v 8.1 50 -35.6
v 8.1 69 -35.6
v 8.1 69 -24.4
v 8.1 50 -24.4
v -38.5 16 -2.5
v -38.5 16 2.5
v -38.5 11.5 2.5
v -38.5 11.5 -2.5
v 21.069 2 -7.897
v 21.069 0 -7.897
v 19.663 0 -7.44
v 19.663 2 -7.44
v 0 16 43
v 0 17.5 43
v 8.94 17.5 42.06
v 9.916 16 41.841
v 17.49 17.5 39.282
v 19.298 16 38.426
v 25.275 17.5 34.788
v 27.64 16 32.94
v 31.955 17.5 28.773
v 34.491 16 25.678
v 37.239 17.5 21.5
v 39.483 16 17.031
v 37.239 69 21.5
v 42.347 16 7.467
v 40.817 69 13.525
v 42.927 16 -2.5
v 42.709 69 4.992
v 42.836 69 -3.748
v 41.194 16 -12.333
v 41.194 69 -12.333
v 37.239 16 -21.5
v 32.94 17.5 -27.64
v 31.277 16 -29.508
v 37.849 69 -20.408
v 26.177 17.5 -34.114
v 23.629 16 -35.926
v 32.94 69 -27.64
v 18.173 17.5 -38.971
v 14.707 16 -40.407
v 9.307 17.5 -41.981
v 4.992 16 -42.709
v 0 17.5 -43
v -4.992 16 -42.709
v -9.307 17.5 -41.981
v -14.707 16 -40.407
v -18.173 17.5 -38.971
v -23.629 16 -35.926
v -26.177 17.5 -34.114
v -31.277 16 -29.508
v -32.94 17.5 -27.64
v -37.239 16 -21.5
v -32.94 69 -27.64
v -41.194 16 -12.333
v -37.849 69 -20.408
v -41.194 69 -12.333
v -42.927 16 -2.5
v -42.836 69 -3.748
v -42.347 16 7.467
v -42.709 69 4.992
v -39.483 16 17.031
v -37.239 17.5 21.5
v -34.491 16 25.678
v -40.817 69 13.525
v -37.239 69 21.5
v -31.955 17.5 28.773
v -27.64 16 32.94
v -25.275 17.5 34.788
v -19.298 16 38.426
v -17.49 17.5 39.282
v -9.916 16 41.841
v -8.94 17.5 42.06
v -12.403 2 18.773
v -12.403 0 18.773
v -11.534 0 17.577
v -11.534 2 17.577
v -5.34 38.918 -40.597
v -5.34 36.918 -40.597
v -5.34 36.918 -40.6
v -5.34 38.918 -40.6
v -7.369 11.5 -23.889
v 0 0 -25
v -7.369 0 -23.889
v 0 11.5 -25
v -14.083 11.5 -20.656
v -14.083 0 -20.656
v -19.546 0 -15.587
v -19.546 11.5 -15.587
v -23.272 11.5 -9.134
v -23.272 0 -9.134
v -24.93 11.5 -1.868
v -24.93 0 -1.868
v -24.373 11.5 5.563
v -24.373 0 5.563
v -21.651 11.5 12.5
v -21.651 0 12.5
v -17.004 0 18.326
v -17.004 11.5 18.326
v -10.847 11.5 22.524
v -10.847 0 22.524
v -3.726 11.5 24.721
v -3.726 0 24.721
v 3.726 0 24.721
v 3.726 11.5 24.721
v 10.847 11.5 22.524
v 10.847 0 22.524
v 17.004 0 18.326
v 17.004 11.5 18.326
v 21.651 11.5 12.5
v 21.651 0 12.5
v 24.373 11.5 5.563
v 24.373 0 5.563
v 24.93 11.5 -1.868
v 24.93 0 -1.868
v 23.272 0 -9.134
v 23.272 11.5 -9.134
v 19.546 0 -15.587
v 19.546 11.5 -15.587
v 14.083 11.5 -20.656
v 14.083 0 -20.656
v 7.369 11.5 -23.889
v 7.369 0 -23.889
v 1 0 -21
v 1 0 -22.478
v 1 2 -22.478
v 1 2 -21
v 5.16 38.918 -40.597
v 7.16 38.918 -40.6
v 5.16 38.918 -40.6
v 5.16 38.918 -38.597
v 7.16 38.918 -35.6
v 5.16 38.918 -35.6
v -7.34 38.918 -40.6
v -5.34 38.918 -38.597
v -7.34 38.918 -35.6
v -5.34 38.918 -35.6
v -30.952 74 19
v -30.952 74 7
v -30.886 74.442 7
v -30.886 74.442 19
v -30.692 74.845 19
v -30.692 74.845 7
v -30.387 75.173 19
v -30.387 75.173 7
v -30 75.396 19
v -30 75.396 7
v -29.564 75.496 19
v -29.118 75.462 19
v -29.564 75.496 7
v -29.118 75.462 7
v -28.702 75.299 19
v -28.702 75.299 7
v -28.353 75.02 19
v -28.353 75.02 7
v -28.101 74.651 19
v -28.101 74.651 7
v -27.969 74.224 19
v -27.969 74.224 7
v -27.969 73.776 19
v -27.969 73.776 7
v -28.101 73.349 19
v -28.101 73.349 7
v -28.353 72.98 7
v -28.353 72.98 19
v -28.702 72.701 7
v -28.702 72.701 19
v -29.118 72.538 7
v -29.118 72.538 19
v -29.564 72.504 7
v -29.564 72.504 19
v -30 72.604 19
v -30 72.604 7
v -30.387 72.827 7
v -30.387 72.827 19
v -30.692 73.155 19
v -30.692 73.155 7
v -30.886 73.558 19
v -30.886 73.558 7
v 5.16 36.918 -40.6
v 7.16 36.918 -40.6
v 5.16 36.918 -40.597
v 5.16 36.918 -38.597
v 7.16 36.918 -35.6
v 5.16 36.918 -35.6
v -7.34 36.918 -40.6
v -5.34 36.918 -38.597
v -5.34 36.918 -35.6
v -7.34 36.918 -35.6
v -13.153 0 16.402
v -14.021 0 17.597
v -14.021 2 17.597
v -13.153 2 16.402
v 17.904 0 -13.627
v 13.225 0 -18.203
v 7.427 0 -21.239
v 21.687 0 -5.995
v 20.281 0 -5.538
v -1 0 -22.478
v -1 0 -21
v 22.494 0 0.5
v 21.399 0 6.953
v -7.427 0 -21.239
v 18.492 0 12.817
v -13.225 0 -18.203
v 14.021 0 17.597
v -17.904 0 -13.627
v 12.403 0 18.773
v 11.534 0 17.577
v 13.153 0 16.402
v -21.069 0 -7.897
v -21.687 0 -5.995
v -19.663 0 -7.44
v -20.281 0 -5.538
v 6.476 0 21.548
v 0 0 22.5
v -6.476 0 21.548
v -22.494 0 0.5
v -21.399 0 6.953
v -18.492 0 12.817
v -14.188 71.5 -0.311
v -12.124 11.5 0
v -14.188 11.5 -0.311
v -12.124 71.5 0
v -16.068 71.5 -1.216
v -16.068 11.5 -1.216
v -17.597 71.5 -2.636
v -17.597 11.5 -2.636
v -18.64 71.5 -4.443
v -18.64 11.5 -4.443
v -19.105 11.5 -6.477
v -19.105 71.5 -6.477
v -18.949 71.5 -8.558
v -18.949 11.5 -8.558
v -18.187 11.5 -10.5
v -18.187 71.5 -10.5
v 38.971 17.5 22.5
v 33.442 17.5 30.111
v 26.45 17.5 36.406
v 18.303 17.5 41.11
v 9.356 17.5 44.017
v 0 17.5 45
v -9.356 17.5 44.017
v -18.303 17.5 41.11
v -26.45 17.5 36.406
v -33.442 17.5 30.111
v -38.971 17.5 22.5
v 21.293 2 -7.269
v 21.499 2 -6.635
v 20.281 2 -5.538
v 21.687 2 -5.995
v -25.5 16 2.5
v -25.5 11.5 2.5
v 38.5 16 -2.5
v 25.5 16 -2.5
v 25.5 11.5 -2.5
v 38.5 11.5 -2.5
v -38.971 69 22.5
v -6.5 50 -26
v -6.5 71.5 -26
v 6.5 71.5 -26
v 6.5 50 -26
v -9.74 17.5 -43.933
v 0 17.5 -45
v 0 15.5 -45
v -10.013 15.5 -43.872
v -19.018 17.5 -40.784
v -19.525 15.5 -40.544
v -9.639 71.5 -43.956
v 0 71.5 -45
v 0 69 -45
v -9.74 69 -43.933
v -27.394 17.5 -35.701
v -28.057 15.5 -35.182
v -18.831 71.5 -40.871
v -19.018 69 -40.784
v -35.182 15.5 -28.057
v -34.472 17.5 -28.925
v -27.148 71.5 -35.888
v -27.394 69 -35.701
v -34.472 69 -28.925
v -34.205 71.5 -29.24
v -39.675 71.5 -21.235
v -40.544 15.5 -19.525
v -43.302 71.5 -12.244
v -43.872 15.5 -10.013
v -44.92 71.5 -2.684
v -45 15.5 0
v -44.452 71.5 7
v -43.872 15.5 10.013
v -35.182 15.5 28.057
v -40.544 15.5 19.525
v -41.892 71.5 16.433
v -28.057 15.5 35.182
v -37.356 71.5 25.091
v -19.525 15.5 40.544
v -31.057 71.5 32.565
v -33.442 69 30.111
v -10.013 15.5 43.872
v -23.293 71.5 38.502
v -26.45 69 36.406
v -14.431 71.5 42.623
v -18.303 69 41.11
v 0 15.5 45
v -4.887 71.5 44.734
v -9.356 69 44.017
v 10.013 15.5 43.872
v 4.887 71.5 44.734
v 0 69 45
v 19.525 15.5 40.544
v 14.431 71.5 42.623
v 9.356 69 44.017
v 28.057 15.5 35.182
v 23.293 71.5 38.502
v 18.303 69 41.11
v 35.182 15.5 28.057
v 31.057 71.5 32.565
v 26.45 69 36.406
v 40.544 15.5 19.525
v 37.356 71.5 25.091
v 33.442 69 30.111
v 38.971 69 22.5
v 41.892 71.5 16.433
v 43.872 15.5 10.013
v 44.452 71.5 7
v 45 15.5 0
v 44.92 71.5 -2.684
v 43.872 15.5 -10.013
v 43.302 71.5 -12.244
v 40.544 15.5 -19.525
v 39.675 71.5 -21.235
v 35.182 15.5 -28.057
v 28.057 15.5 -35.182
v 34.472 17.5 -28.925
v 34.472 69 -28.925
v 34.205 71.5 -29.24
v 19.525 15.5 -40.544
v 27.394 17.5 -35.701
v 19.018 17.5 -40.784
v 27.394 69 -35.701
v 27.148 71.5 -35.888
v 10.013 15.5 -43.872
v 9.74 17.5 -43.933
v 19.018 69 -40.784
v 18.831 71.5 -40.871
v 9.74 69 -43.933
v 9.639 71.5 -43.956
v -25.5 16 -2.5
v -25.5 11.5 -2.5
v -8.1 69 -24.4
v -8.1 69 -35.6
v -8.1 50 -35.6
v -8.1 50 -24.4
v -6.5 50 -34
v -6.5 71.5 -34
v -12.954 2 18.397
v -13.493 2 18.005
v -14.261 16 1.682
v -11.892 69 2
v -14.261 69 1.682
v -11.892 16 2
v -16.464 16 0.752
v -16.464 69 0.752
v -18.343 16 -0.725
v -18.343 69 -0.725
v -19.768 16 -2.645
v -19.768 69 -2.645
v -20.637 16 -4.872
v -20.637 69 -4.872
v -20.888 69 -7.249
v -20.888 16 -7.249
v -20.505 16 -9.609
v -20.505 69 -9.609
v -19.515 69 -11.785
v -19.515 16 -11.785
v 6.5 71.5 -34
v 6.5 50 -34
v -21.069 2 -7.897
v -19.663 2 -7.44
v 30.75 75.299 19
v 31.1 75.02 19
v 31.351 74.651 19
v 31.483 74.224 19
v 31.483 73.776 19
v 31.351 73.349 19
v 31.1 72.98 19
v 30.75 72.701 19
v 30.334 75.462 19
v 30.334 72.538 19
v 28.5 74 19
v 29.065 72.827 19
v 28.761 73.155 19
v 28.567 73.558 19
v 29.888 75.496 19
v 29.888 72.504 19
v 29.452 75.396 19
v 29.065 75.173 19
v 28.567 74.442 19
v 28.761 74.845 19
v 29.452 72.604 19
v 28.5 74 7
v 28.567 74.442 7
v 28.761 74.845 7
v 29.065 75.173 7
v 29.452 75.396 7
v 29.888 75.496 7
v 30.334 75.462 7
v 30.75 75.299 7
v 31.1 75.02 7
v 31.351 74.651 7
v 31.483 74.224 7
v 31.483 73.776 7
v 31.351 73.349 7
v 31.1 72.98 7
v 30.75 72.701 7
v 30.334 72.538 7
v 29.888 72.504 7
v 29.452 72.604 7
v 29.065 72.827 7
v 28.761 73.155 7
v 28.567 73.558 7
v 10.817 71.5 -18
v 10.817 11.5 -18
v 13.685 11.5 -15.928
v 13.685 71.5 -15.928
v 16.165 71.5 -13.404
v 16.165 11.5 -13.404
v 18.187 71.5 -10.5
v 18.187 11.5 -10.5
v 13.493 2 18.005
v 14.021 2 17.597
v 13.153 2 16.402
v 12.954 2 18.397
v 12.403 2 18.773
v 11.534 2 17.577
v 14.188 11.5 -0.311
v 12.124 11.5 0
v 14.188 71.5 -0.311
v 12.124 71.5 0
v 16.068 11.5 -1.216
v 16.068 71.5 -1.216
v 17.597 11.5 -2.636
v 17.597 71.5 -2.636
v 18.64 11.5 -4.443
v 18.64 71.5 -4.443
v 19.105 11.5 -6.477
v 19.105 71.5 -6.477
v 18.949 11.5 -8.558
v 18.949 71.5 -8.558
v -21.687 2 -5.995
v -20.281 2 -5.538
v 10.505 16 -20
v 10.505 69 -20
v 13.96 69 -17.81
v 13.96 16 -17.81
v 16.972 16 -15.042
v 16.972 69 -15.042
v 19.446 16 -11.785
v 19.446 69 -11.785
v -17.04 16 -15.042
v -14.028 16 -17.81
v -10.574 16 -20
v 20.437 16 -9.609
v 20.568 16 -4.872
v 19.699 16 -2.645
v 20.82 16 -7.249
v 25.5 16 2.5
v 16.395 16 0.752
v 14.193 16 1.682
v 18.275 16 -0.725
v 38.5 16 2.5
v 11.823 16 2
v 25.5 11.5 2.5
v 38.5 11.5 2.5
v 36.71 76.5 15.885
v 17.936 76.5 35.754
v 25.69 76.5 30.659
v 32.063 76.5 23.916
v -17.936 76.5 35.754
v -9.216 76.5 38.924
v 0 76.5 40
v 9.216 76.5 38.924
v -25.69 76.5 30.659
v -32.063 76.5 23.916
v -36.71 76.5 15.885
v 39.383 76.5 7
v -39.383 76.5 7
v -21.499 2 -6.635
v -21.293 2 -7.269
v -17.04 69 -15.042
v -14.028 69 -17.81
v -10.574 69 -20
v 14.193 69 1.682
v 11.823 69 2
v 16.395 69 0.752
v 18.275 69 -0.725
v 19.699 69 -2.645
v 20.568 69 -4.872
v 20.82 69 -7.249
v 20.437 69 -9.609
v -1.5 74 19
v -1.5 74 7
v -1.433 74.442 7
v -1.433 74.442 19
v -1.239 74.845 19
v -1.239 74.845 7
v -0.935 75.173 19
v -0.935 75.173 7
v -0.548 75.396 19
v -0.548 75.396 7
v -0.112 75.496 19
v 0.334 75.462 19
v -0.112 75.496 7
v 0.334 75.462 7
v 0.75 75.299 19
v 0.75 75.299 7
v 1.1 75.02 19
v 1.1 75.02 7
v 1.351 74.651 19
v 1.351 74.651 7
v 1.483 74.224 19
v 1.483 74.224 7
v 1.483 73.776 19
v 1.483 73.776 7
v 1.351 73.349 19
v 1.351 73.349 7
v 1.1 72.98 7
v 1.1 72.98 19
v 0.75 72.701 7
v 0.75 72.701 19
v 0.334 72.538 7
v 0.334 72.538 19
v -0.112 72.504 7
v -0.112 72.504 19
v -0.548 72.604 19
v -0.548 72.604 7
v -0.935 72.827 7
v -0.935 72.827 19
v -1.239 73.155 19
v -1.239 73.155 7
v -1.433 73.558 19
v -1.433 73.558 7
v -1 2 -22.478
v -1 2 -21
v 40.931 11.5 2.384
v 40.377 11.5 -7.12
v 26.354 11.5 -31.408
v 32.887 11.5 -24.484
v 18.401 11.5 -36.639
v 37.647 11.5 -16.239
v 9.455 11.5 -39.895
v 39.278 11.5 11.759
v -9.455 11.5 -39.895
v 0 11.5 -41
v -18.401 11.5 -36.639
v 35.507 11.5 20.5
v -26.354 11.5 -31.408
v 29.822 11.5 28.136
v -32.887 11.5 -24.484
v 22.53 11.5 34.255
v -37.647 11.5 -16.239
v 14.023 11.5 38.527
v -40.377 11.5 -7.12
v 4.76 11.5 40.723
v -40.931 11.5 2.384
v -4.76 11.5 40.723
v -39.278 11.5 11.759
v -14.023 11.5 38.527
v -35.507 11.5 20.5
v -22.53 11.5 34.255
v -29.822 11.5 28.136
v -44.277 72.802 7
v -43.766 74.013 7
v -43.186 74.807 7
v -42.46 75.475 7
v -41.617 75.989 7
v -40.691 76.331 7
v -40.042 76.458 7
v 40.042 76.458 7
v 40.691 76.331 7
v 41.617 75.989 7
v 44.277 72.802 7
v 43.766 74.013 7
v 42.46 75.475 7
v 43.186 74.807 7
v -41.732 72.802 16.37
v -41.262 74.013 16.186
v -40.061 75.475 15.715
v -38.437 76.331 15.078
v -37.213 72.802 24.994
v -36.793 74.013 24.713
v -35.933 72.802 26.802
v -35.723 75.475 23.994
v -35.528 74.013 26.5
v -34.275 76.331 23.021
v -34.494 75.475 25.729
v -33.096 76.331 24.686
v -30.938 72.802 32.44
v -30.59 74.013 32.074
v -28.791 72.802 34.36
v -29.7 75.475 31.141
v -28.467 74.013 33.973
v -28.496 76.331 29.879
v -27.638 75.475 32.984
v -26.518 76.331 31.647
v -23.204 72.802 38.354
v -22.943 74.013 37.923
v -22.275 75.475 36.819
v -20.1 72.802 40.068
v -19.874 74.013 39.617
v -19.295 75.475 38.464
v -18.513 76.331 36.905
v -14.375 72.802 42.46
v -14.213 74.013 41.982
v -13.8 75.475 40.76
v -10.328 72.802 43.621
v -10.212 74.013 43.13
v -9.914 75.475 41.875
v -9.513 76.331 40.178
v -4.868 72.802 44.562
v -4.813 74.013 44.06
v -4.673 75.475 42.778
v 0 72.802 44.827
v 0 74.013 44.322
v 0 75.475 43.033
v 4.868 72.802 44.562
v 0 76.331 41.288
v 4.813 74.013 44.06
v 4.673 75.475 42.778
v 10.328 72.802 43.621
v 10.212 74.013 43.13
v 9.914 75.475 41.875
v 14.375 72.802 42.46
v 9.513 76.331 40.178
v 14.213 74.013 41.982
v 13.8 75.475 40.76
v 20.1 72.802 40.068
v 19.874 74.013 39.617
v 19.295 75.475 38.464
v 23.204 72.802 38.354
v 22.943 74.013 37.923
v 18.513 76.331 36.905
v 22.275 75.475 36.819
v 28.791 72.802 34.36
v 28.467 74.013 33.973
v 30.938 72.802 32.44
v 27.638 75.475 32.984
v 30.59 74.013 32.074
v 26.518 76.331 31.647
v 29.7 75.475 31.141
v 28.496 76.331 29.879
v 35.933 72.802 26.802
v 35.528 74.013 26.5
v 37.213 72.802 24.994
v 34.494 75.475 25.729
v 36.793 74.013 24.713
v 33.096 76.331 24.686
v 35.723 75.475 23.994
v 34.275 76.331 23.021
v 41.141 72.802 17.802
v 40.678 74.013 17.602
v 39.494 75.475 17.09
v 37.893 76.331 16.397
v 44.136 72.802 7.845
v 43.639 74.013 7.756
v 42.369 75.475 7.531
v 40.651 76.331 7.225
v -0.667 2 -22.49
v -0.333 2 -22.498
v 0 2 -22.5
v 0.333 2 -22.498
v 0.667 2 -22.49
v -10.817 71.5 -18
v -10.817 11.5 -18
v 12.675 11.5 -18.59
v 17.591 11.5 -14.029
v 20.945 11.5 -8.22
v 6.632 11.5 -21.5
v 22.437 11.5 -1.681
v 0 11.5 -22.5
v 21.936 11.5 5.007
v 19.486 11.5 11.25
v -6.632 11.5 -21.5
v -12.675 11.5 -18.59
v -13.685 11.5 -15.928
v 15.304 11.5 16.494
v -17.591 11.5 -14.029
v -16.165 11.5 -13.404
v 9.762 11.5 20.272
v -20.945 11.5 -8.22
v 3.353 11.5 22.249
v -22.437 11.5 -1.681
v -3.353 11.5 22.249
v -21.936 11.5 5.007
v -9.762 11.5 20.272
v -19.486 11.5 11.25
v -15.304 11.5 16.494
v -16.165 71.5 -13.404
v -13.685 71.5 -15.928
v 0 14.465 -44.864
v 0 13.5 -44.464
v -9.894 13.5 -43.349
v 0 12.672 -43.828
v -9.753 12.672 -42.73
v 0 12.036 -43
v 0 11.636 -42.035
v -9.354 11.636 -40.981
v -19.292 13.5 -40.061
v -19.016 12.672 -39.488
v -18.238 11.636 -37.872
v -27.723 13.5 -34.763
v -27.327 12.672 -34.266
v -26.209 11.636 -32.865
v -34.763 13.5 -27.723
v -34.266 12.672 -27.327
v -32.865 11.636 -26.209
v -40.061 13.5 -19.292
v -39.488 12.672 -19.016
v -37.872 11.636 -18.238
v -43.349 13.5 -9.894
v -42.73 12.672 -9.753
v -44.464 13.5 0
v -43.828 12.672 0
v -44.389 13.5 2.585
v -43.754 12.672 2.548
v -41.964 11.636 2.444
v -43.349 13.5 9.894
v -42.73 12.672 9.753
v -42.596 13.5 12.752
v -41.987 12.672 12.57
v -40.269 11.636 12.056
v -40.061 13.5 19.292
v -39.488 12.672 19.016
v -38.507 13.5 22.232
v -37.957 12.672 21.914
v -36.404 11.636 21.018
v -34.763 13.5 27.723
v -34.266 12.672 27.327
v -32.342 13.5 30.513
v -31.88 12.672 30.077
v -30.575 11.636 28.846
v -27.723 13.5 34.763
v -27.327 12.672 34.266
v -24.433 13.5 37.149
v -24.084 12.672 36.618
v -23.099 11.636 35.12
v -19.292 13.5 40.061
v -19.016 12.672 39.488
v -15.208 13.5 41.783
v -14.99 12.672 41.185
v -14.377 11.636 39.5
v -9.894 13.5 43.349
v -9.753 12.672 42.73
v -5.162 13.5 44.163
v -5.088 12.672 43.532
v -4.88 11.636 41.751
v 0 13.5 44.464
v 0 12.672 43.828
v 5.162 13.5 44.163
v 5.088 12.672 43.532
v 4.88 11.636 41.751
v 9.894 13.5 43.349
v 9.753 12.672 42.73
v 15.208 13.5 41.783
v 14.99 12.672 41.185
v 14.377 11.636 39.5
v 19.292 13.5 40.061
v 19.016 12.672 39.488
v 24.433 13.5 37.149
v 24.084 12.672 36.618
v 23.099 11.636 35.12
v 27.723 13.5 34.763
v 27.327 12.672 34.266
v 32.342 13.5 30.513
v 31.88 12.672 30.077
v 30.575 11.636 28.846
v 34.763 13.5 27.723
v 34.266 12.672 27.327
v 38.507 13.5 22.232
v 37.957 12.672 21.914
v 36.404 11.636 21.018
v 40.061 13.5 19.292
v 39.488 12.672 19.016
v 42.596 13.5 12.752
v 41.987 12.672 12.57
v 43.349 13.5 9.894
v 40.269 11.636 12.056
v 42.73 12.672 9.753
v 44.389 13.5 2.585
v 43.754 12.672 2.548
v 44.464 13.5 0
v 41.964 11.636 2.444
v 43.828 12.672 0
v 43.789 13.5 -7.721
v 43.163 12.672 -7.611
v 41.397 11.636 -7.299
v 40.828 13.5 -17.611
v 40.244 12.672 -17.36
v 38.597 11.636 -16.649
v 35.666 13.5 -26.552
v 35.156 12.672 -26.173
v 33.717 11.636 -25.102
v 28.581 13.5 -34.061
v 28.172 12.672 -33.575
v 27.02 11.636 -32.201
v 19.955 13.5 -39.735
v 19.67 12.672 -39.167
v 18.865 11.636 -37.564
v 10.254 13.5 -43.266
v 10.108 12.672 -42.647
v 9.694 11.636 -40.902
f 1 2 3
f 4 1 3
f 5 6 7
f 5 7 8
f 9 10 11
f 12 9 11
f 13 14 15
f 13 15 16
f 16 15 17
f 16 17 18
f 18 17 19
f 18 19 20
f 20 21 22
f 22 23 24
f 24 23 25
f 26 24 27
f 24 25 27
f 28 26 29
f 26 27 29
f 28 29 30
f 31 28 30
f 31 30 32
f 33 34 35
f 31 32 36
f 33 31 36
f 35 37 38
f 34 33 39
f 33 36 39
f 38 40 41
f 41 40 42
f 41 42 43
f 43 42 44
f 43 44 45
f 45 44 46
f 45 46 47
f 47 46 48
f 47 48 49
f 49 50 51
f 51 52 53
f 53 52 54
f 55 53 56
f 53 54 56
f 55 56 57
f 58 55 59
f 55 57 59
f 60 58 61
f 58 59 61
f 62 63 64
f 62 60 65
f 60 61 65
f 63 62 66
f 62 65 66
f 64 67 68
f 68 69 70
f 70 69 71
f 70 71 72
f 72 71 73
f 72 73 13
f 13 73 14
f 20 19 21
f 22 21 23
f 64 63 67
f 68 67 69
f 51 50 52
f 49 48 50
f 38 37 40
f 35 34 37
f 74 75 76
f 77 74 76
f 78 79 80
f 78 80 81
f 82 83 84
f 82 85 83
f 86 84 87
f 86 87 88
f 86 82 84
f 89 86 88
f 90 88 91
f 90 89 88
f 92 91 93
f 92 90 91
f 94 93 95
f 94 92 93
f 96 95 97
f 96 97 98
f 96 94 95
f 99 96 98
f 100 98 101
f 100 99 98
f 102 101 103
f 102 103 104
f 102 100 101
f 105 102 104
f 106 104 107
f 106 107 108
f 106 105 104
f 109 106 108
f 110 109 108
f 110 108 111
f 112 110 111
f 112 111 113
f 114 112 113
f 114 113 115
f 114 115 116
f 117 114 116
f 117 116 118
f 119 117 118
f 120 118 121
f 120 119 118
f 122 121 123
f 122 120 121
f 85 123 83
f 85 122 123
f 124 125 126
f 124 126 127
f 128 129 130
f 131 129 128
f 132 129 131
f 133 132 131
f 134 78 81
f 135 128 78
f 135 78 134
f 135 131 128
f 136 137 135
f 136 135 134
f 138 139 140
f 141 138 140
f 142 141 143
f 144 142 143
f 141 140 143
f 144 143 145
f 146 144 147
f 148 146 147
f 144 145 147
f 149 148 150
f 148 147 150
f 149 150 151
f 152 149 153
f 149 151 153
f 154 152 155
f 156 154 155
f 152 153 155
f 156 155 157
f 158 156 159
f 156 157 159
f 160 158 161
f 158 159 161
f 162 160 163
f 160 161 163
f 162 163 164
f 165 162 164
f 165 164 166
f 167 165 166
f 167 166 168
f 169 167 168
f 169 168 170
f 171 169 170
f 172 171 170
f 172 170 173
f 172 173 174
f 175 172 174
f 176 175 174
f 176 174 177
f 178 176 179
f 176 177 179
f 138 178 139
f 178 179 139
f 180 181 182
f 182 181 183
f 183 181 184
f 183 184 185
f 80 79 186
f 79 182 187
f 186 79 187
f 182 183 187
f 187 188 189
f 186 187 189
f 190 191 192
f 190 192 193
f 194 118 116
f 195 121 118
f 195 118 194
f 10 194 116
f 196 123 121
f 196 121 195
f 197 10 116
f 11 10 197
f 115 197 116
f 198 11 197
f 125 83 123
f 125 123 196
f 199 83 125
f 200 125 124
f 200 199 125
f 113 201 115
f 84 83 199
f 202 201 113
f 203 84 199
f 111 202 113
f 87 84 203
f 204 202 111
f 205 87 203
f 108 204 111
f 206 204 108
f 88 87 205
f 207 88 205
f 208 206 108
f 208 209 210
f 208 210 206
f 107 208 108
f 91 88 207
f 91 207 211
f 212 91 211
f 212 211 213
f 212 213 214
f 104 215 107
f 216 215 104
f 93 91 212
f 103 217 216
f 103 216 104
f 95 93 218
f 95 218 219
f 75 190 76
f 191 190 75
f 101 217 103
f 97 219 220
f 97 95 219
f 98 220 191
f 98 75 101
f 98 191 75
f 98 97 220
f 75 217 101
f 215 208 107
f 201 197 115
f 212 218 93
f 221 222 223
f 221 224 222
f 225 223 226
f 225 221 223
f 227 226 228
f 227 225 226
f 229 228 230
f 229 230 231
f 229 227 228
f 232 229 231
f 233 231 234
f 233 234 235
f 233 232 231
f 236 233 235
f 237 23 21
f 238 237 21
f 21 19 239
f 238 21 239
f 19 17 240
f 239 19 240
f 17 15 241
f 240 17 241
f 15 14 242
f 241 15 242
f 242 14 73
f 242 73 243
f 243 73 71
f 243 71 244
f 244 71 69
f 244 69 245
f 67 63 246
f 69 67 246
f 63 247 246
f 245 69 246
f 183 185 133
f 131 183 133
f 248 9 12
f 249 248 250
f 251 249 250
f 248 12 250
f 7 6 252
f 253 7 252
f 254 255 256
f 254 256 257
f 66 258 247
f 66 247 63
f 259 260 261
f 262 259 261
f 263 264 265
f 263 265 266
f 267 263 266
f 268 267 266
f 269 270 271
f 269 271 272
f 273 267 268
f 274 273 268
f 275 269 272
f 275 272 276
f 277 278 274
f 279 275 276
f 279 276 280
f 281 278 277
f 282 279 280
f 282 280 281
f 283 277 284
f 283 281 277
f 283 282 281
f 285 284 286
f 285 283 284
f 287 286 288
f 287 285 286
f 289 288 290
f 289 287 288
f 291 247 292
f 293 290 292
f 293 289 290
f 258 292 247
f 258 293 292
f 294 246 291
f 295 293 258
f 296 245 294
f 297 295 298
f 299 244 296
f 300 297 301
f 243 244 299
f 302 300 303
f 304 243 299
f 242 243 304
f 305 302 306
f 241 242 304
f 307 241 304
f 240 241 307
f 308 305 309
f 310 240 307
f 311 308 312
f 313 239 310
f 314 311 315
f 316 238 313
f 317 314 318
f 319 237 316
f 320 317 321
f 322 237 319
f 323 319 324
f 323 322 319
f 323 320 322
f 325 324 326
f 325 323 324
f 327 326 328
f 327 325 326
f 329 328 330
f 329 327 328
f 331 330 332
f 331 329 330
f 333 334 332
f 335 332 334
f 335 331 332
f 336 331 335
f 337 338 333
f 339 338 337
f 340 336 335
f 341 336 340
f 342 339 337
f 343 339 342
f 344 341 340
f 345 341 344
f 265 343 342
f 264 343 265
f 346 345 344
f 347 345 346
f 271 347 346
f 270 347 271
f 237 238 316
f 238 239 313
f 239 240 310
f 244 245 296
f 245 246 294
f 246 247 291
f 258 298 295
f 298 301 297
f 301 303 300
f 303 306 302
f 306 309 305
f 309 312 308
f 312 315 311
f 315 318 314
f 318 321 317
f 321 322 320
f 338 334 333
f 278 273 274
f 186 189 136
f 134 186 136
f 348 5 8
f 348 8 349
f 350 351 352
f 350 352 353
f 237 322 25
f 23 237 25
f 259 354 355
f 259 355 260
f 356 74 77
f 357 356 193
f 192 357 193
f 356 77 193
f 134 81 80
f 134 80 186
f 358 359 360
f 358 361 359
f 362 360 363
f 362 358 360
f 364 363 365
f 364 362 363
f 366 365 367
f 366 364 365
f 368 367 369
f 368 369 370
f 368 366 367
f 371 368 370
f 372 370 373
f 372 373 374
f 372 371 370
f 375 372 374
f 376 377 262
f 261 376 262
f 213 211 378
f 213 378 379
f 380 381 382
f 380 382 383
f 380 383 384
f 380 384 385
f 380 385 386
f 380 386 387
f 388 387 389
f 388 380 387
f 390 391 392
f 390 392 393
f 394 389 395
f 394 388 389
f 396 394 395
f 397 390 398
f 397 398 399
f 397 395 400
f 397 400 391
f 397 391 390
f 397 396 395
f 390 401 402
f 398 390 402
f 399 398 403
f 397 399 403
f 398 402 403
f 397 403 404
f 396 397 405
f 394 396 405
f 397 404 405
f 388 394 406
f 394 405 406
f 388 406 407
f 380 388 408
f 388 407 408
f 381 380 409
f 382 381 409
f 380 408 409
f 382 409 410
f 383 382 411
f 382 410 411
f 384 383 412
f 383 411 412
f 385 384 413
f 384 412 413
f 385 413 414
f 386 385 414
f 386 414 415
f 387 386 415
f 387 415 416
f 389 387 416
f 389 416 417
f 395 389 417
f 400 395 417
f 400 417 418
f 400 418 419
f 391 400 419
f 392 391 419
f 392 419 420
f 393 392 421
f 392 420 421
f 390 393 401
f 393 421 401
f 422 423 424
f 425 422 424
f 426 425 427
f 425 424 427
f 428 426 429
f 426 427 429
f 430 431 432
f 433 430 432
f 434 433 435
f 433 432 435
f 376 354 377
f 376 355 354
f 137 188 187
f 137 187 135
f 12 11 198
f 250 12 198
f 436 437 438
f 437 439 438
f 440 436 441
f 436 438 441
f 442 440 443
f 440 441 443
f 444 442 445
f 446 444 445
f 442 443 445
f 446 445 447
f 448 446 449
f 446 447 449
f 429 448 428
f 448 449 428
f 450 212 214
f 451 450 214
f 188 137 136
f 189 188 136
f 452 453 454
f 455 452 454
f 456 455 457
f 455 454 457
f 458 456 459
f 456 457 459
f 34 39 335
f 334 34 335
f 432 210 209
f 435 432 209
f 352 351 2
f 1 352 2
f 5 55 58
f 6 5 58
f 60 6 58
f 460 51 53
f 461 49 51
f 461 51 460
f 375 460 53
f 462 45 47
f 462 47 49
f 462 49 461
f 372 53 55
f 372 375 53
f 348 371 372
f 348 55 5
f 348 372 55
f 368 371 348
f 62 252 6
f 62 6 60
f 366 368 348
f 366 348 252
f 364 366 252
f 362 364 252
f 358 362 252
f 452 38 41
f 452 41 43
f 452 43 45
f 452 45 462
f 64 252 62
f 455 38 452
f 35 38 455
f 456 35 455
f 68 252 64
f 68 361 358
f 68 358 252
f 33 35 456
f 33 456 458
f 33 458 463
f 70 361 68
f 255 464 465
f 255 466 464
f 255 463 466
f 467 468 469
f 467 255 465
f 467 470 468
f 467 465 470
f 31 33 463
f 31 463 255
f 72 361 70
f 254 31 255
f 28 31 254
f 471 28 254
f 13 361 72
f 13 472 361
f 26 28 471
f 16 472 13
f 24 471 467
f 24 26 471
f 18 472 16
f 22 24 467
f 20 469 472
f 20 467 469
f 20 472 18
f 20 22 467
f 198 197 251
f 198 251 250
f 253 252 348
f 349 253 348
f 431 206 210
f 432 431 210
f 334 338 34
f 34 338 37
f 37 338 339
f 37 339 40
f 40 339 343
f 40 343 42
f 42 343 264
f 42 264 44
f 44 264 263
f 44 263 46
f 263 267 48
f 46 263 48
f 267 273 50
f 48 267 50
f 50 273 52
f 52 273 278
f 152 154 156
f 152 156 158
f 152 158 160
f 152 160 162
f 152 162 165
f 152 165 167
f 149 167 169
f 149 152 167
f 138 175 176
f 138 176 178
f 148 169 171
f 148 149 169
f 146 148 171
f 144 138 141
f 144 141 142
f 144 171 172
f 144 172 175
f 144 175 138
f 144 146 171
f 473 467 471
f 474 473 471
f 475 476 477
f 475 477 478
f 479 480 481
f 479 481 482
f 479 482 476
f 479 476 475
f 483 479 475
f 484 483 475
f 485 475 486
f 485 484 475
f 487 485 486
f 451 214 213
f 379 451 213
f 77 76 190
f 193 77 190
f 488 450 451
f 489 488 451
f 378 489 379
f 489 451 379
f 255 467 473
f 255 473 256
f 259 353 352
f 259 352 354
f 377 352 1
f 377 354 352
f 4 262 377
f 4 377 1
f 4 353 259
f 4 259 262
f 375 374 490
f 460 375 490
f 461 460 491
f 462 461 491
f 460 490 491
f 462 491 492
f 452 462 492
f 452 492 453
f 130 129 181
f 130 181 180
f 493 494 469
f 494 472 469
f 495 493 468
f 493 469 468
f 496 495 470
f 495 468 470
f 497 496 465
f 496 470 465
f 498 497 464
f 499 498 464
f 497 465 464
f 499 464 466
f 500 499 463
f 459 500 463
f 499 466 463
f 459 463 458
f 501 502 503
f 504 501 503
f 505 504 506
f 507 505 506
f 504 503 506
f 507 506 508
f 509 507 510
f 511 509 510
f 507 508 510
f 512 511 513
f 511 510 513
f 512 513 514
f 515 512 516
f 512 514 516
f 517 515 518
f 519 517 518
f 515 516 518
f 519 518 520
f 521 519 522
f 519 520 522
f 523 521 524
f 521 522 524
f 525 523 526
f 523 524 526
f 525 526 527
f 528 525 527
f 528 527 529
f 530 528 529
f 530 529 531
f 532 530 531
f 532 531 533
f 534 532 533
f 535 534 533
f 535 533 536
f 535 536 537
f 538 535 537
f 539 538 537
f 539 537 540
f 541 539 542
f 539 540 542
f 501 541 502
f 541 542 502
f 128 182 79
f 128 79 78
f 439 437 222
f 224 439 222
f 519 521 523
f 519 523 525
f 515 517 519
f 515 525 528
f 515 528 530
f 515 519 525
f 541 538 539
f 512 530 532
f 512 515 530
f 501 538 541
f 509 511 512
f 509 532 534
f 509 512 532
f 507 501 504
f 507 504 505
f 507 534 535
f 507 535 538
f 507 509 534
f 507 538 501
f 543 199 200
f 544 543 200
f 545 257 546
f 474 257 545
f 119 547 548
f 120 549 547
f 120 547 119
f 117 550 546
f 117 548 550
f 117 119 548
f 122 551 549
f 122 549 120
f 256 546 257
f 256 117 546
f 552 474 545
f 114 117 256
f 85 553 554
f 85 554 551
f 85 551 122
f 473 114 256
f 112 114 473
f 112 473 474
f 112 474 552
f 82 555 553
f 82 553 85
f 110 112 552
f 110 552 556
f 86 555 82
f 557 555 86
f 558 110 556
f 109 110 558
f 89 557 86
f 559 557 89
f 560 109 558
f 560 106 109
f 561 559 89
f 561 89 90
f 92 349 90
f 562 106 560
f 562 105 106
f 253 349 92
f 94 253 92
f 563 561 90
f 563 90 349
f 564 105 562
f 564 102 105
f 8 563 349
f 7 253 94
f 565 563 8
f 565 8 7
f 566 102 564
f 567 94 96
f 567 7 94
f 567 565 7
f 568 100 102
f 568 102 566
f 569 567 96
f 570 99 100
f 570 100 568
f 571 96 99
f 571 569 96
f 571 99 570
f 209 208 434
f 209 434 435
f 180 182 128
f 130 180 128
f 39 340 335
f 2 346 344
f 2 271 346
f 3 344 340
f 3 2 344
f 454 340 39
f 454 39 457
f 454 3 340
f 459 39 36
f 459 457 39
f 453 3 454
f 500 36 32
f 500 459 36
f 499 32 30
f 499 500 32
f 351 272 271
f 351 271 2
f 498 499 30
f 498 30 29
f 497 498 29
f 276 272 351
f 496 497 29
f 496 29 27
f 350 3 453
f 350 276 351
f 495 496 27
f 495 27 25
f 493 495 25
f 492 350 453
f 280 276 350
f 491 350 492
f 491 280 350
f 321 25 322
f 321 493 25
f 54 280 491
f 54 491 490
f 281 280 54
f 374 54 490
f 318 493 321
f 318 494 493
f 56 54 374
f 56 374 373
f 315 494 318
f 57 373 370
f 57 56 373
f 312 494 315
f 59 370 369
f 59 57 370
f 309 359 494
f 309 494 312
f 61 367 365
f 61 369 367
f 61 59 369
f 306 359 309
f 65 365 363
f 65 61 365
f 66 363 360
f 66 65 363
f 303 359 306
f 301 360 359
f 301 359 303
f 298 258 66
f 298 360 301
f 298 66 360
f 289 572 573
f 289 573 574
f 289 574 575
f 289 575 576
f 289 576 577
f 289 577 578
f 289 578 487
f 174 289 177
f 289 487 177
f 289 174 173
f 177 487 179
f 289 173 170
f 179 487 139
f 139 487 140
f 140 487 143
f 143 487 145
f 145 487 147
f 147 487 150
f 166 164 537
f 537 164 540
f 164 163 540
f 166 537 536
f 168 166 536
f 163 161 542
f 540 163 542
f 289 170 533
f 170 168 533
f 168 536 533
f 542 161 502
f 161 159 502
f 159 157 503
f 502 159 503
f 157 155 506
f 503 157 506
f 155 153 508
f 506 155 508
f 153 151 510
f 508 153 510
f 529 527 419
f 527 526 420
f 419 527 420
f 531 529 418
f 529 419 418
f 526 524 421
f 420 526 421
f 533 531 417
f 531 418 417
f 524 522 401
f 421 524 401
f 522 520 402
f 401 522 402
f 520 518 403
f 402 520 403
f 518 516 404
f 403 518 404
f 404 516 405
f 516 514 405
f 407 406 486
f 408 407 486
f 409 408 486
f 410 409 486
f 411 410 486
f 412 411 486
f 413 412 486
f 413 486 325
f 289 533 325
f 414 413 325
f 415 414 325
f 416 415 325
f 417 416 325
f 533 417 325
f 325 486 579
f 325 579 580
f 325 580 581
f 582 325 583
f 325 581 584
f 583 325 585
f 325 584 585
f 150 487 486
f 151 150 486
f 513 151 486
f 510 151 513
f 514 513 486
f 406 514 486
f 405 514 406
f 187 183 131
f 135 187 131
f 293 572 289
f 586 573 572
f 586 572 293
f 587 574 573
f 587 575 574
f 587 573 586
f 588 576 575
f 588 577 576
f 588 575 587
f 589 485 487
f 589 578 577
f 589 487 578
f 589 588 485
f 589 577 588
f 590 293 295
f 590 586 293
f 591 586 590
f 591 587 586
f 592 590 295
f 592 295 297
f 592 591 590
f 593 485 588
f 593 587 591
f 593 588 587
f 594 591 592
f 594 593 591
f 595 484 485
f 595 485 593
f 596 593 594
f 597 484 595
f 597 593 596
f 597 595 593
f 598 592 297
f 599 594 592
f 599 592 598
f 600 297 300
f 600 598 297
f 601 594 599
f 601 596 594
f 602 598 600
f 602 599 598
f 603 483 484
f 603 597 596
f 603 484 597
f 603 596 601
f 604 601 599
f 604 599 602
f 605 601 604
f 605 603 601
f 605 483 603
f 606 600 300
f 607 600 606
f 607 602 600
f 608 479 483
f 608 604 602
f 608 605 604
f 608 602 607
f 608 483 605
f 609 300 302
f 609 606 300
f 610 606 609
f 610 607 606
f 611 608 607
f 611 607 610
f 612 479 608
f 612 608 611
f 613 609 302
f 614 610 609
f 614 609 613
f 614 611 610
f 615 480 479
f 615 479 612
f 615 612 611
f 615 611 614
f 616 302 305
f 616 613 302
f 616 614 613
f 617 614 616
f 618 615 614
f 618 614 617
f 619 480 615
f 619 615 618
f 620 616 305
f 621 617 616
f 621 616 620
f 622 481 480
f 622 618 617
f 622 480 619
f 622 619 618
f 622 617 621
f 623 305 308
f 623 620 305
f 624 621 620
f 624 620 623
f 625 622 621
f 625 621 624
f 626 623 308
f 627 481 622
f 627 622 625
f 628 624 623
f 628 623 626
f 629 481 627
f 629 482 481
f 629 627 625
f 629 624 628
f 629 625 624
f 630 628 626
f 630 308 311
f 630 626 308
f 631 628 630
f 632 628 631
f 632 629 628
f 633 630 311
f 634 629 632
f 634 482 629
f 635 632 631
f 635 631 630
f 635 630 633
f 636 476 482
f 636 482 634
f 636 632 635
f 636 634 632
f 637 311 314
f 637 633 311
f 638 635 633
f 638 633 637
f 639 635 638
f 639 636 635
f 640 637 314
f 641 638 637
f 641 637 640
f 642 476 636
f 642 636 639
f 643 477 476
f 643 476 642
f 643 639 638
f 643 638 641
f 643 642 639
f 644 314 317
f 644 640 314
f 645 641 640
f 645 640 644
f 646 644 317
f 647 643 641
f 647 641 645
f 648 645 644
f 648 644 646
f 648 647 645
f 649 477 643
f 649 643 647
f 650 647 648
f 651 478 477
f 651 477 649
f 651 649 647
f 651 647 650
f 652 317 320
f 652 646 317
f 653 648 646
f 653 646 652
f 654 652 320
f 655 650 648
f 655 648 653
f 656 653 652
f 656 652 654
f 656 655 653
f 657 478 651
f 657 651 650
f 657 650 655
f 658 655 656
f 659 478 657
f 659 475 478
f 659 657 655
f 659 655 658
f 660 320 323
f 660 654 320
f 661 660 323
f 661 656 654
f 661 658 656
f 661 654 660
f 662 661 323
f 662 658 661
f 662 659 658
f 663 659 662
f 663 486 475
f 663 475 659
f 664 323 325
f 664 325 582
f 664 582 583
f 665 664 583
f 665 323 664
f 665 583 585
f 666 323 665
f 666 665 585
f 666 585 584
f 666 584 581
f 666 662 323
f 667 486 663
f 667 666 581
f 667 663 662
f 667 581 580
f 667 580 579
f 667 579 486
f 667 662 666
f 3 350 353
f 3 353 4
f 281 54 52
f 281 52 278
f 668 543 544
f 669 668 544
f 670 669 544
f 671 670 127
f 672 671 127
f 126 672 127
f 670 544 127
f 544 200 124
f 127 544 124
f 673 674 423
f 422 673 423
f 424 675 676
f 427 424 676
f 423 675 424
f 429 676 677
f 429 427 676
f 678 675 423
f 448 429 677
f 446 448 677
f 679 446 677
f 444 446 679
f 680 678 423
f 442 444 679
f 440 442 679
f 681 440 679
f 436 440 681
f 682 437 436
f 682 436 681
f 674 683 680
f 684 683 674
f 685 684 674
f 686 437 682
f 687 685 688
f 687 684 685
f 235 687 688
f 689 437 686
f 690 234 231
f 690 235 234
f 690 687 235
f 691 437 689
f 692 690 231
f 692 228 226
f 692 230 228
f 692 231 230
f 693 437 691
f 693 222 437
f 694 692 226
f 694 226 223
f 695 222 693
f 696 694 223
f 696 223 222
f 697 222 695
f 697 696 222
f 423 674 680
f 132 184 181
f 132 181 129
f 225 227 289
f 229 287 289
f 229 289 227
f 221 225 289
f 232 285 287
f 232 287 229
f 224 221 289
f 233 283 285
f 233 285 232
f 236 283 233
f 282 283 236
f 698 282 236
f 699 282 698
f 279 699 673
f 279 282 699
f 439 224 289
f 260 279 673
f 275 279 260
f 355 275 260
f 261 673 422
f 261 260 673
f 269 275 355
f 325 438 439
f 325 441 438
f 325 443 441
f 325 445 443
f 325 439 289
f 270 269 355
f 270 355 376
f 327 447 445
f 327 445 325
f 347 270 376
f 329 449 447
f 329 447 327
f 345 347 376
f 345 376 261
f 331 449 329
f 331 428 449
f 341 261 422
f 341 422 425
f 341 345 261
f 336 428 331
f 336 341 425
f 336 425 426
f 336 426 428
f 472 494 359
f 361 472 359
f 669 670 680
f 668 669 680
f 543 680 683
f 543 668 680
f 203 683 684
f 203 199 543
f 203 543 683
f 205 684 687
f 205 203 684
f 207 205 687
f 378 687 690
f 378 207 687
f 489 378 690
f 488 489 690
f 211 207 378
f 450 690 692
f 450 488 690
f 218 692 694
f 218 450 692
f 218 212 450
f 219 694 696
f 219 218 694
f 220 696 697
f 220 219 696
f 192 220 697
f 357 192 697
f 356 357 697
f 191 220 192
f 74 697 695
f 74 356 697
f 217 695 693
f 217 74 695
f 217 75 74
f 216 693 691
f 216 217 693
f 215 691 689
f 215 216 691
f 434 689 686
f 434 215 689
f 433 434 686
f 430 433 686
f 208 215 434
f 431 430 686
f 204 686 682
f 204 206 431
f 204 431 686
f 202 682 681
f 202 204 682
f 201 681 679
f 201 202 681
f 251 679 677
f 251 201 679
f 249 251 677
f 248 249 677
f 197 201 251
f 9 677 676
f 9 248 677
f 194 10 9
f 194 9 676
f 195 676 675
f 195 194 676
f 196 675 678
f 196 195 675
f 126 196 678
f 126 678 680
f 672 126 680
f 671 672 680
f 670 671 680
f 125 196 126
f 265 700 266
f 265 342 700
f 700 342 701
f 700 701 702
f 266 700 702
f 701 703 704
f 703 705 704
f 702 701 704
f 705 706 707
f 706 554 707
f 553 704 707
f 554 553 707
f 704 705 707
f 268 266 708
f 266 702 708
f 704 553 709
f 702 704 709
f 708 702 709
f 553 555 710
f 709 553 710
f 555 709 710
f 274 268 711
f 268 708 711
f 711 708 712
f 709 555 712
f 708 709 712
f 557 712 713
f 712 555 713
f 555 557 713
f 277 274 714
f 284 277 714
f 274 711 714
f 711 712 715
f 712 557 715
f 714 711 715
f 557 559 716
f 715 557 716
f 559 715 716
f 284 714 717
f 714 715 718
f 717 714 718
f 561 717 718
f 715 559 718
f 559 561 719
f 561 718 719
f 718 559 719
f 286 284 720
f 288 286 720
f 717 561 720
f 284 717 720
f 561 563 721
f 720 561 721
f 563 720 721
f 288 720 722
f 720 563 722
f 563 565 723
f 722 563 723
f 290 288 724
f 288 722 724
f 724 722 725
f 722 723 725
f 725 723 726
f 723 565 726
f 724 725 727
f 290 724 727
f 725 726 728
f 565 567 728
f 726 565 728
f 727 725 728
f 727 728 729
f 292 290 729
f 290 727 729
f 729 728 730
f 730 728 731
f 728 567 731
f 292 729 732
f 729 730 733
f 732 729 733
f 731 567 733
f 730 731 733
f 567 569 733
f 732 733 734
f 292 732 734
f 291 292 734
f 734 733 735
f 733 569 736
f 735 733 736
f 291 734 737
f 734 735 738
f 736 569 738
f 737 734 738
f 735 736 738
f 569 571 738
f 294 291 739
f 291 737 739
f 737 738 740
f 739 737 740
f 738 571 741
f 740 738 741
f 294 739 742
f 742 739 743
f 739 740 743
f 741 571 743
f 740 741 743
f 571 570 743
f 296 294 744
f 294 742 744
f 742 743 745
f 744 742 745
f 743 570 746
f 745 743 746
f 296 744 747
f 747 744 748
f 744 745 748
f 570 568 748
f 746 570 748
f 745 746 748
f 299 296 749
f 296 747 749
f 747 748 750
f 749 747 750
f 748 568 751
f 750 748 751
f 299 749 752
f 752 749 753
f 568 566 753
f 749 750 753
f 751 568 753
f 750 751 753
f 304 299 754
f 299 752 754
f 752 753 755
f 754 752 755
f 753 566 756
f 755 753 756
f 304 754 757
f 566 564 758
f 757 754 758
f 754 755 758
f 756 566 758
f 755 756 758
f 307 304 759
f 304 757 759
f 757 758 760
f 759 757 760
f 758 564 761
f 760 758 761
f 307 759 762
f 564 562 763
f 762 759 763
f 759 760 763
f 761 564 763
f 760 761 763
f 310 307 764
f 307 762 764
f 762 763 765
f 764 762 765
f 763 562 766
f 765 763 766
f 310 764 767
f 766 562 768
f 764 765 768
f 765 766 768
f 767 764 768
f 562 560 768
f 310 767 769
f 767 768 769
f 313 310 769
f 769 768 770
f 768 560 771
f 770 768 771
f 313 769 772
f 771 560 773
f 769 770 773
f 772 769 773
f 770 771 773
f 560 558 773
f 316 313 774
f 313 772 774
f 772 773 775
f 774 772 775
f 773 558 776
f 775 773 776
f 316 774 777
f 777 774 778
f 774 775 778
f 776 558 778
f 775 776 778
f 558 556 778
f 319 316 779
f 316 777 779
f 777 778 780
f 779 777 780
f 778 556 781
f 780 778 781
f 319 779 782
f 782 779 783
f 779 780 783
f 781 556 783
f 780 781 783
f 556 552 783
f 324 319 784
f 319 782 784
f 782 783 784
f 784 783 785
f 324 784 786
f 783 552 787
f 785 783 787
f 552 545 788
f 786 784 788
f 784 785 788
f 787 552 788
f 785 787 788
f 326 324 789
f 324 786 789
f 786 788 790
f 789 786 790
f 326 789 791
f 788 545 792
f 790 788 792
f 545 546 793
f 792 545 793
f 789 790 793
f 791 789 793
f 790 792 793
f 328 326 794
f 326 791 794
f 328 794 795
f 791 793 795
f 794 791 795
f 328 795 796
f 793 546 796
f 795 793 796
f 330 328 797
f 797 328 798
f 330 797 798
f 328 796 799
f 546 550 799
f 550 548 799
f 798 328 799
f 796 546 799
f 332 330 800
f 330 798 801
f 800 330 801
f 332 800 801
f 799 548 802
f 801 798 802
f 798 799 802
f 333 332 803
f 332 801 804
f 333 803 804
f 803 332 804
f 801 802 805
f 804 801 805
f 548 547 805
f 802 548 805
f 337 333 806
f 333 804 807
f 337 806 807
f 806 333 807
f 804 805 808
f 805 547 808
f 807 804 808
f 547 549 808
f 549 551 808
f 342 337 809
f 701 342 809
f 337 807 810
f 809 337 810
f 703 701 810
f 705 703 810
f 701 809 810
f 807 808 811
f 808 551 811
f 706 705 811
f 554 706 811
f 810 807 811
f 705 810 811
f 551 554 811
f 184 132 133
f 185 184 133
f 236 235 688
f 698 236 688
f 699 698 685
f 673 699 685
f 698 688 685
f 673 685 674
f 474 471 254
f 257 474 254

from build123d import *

# Parameters (mm, degrees)
CUT_EXTRUDE1_DEPTH           = 5
CUT_EXTRUDE3_DEPTH           = 60
SKETCH8_R                    = 43
CUT_EXTRUDE4_DEPTH           = 53
FILLET1_R                    = 7
SKETCH12_W                   = 6.5
SKETCH12_H                   = 51.5
CUT_REVOLVE1_ANGLE           = 60
CUT_REVOLVE1_OTHER_WAY_ANGLE = 60
SKETCH18_W                   = 13
SKETCH18_H                   = 8
CUT_EXTRUDE13_DEPTH          = 5
SKETCH20_W                   = 100
SKETCH20_H                   = 7
CUT_EXTRUDE15_DEPTH          = 5
SKETCH19_R                   = 1.5
CUT_EXTRUDE14_DEPTH          = 12
FILLET3_R                    = 4
SKETCH24_W                   = 2
SKETCH24_H                   = 3
BOSS_EXTRUDE3_DEPTH          = 2
CIRPATTERN2_COUNT            = 5
SKETCH26_W                   = 5
SKETCH26_H                   = 51.5
CUT_REVOLVE2_ANGLE           = 50
CUT_REVOLVE2_OTHER_WAY_ANGLE = 50
SKETCH29_W                   = 16.2
SKETCH29_H                   = 11.2
SKETCH29_W_2                 = 13
SKETCH29_H_2                 = 8
BOSS_EXTRUDE4_DEPTH          = 19
SKETCH36_W                   = 2
SKETCH36_H                   = 2
BOSS_EXTRUDE7_DEPTH          = 5
SKETCH37_W                   = 2
SKETCH37_H                   = 2
BOSS_EXTRUDE8_DEPTH          = 12.5
SKETCH40_W                   = 2
SKETCH40_H                   = 2
BOSS_EXTRUDE9_DEPTH          = 5
FILLET8_R                    = 9
SKETCH50_W                   = 13
SKETCH50_H                   = 5
CUT_EXTRUDE23_DEPTH          = 7


with BuildPart() as part:
    # Sketch1 → Revolve1 (revolve)
    with BuildSketch(Plane.XY, mode=Mode.PRIVATE) as revolve1_sk:
        with BuildLine():
            Line((0, 76.5), (0, 11.5))
            Line((0, 11.5), (22.5, 11.5))
            Line((22.5, 11.5), (22.5, 0))
            Line((22.5, 0), (25, 0))
            Line((25, 0), (25, 11.5))
            Line((25, 11.5), (45, 11.5))
            Line((45, 11.5), (45, 71.5))
            ThreePointArc((45, 71.5), (43.535533906, 75.035533906), (40, 76.5))
            Line((40, 76.5), (0, 76.5))
        make_face()
    revolve(revolve1_sk.sketch.rotate(Axis((0, 2, 0), (0, 1, 0)), 90), axis=Axis((0, 2, 0), (0, 1, 0)))

    # Sketch5 → Cut-Extrude1 (cut)
    with BuildSketch(Plane(origin=(0, 76.5, 0), x_dir=(1, 0, 0), z_dir=(0, 1, 0))):
        with BuildLine():
            Line((-45, 0), (45, 0))
            ThreePointArc((45, 0), (0, 45), (-45, 0))
        make_face()
    extrude(amount=-CUT_EXTRUDE1_DEPTH, mode=Mode.SUBTRACT)

    # Sketch7 → Cut-Extrude3 (cut)
    with BuildSketch(Plane.XZ.offset(-11.5)):
        with BuildLine():
            Line((21, 0), (-21, 0))
            ThreePointArc((-21, 0), (-18.277714988, -10.340461055), (-10.816653826, -18))
            Line((-10.816653826, -18), (10.816653826, -18))
            ThreePointArc((10.816653826, -18), (18.277714988, -10.340461055), (21, 0))
        make_face()
    extrude(amount=-CUT_EXTRUDE3_DEPTH, mode=Mode.SUBTRACT)

    # Sketch8 → Cut-Extrude4 (cut)
    with BuildSketch(Plane(origin=(0, 69, 0), x_dir=(1, 0, 0), z_dir=(0, 1, 0))):
        with Locations(Location((0, 0, 0), (0, 0, 270))):
            Circle(SKETCH8_R)
        with BuildLine():
            Line((22.912878475, -2), (-22.981606036, -2))
            ThreePointArc((-22.981606036, -2), (-20.067855169, 10.855581536), (-10.573881727, 20))
            Line((-10.573881727, 20), (10.505154166, 20))
            ThreePointArc((10.505154166, 20), (19.999127608, 10.855581536), (22.912878475, -2))
        make_face(mode=Mode.SUBTRACT)
    extrude(amount=-CUT_EXTRUDE4_DEPTH, mode=Mode.SUBTRACT)

    # Fillet1
    fillet1_edges = [part.edges().sort_by_distance(p)[0] for p in [
        (-21, 41.5, 0),
        (21, 41.5, 0),
    ]]
    fillet(fillet1_edges, radius=FILLET1_R)

    # Sketch12 → Cut-Revolve1 (revolve, cut)
    with BuildSketch(Plane(origin=(0, 0, 0), x_dir=(0, 0, -1), z_dir=(1, 0, 0))):
        with Locations((-44.75, 43.25)):
            Rectangle(SKETCH12_W, SKETCH12_H)
    revolve(axis=Axis((0, 71.5, 0), (0, -1, 0)), revolution_arc=CUT_REVOLVE1_ANGLE, mode=Mode.SUBTRACT)

    # Sketch12 → Cut-Revolve1 other way (revolve, cut)
    with BuildSketch(Plane(origin=(0, 0, 0), x_dir=(0, 0, -1), z_dir=(1, 0, 0))):
        with Locations((-44.75, 43.25)):
            Rectangle(SKETCH12_W, SKETCH12_H)
    revolve(axis=Axis((0, 71.5, 0), (0, 1, 0)), revolution_arc=CUT_REVOLVE1_OTHER_WAY_ANGLE, mode=Mode.SUBTRACT)

    # Sketch18 → Cut-Extrude13 (cut)
    with BuildSketch(Plane(origin=(0, 71.5, 0), x_dir=(1, 0, 0), z_dir=(0, 1, 0))):
        with Locations((0, 30)):
            Rectangle(SKETCH18_W, SKETCH18_H)
    extrude(amount=-CUT_EXTRUDE13_DEPTH, mode=Mode.SUBTRACT)

    # Sketch20 → Cut-Extrude15 (cut)
    with BuildSketch(Plane(origin=(0, 76.5, 0), x_dir=(1, 0, 0), z_dir=(0, 1, 0))):
        with Locations((0, -3.5)):
            Rectangle(SKETCH20_W, SKETCH20_H)
    extrude(amount=-CUT_EXTRUDE15_DEPTH, mode=Mode.SUBTRACT)

    # Sketch19 → Cut-Extrude14 (cut)
    with BuildSketch(Plane(origin=(0, 0, 7), x_dir=(-1, 0, 0), z_dir=(0, 0, -1))):
        with Locations((0, 74)):
            Circle(SKETCH19_R)
        with Locations((-30, 74)):
            Circle(SKETCH19_R)
        with Locations((29.452221542, 74)):
            Circle(SKETCH19_R)
    extrude(amount=-CUT_EXTRUDE14_DEPTH, mode=Mode.SUBTRACT)

    # Fillet3
    fillet3_edges = [part.edges().sort_by_distance(p)[0] for p in [
        (0, 11.5, 45),
    ]]
    fillet(fillet3_edges, radius=FILLET3_R)

    # Sketch24 → Boss-Extrude3 (add)
    with BuildSketch(Plane.XZ):
        with Locations((0, -22.5)):
            Rectangle(SKETCH24_W, SKETCH24_H)
    boss_extrude3 = extrude(amount=-BOSS_EXTRUDE3_DEPTH)

    # CirPattern2: Boss-Extrude3 ×5 about axis
    cirpattern2_axis = Axis((0, 0, 0), (0, 1, 0))
    for i in range(1, CIRPATTERN2_COUNT):
        add(boss_extrude3.rotate(cirpattern2_axis, i * 360 / CIRPATTERN2_COUNT))

    # Sketch26 → Cut-Revolve2 (revolve, cut)
    with BuildSketch(Plane(origin=(0, 0, 0), x_dir=(0, 0, -1), z_dir=(1, 0, 0))):
        with Locations((45.056943441, 43.25)):
            Rectangle(SKETCH26_W, SKETCH26_H)
    revolve(axis=Axis((0, 2, 0), (0, -1, 0)), revolution_arc=CUT_REVOLVE2_ANGLE, mode=Mode.SUBTRACT)

    # Sketch26 → Cut-Revolve2 other way (revolve, cut)
    with BuildSketch(Plane(origin=(0, 0, 0), x_dir=(0, 0, -1), z_dir=(1, 0, 0))):
        with Locations((45.056943441, 43.25)):
            Rectangle(SKETCH26_W, SKETCH26_H)
    revolve(axis=Axis((0, 2, 0), (0, 1, 0)), revolution_arc=CUT_REVOLVE2_OTHER_WAY_ANGLE, mode=Mode.SUBTRACT)

    # Sketch29 → Boss-Extrude4 (add)
    with BuildSketch(Plane.XZ.offset(-69)):
        with Locations((0, -30)):
            Rectangle(SKETCH29_W, SKETCH29_H)
        with Locations((0, -30)):
            Rectangle(SKETCH29_W_2, SKETCH29_H_2, mode=Mode.SUBTRACT)
    extrude(amount=BOSS_EXTRUDE4_DEPTH)

    # Fillet8
    fillet8_edges = [part.edges().sort_by_distance(p)[0] for p in [
        (-22.981606036, 42.5, 2),
        (22.912878475, 42.5, 2),
    ]]
    fillet(fillet8_edges, radius=FILLET8_R)

    # Sketch50 → Cut-Extrude23 (cut)
    with BuildSketch(Plane(origin=(0, 16, 0), x_dir=(1, 0, 0), z_dir=(0, 1, 0))):
        with Locations((32, 0)):
            Rectangle(SKETCH50_W, SKETCH50_H)
        with Locations((-32, 0)):
            Rectangle(SKETCH50_W, SKETCH50_H)
    extrude(amount=-CUT_EXTRUDE23_DEPTH, mode=Mode.SUBTRACT)


with BuildPart() as body_2:
    # Sketch36 → Boss-Extrude7 (new body)
    with BuildSketch(Plane(origin=(0, 0, -35.6), x_dir=(-1, 0, 0), z_dir=(0, 0, -1))):
        with Locations((-6.159647943, 37.918102195)):
            Rectangle(SKETCH36_W, SKETCH36_H)
    extrude(amount=BOSS_EXTRUDE7_DEPTH)

    # Sketch37 → Boss-Extrude8 (add)
    with BuildSketch(Plane.ZY.offset(-5.159647943)):
        with Locations((-39.597351245, 37.918102195)):
            Rectangle(SKETCH37_W, SKETCH37_H)
    extrude(amount=BOSS_EXTRUDE8_DEPTH)

    # Sketch40 → Boss-Extrude9 (add)
    with BuildSketch(Plane(origin=(0, 0, -35.6), x_dir=(-1, 0, 0), z_dir=(0, 0, -1))):
        with Locations((6.340352057, 37.918102195)):
            Rectangle(SKETCH40_W, SKETCH40_H)
    extrude(amount=BOSS_EXTRUDE9_DEPTH)


solid = Compound([part.part, body_2.part])
